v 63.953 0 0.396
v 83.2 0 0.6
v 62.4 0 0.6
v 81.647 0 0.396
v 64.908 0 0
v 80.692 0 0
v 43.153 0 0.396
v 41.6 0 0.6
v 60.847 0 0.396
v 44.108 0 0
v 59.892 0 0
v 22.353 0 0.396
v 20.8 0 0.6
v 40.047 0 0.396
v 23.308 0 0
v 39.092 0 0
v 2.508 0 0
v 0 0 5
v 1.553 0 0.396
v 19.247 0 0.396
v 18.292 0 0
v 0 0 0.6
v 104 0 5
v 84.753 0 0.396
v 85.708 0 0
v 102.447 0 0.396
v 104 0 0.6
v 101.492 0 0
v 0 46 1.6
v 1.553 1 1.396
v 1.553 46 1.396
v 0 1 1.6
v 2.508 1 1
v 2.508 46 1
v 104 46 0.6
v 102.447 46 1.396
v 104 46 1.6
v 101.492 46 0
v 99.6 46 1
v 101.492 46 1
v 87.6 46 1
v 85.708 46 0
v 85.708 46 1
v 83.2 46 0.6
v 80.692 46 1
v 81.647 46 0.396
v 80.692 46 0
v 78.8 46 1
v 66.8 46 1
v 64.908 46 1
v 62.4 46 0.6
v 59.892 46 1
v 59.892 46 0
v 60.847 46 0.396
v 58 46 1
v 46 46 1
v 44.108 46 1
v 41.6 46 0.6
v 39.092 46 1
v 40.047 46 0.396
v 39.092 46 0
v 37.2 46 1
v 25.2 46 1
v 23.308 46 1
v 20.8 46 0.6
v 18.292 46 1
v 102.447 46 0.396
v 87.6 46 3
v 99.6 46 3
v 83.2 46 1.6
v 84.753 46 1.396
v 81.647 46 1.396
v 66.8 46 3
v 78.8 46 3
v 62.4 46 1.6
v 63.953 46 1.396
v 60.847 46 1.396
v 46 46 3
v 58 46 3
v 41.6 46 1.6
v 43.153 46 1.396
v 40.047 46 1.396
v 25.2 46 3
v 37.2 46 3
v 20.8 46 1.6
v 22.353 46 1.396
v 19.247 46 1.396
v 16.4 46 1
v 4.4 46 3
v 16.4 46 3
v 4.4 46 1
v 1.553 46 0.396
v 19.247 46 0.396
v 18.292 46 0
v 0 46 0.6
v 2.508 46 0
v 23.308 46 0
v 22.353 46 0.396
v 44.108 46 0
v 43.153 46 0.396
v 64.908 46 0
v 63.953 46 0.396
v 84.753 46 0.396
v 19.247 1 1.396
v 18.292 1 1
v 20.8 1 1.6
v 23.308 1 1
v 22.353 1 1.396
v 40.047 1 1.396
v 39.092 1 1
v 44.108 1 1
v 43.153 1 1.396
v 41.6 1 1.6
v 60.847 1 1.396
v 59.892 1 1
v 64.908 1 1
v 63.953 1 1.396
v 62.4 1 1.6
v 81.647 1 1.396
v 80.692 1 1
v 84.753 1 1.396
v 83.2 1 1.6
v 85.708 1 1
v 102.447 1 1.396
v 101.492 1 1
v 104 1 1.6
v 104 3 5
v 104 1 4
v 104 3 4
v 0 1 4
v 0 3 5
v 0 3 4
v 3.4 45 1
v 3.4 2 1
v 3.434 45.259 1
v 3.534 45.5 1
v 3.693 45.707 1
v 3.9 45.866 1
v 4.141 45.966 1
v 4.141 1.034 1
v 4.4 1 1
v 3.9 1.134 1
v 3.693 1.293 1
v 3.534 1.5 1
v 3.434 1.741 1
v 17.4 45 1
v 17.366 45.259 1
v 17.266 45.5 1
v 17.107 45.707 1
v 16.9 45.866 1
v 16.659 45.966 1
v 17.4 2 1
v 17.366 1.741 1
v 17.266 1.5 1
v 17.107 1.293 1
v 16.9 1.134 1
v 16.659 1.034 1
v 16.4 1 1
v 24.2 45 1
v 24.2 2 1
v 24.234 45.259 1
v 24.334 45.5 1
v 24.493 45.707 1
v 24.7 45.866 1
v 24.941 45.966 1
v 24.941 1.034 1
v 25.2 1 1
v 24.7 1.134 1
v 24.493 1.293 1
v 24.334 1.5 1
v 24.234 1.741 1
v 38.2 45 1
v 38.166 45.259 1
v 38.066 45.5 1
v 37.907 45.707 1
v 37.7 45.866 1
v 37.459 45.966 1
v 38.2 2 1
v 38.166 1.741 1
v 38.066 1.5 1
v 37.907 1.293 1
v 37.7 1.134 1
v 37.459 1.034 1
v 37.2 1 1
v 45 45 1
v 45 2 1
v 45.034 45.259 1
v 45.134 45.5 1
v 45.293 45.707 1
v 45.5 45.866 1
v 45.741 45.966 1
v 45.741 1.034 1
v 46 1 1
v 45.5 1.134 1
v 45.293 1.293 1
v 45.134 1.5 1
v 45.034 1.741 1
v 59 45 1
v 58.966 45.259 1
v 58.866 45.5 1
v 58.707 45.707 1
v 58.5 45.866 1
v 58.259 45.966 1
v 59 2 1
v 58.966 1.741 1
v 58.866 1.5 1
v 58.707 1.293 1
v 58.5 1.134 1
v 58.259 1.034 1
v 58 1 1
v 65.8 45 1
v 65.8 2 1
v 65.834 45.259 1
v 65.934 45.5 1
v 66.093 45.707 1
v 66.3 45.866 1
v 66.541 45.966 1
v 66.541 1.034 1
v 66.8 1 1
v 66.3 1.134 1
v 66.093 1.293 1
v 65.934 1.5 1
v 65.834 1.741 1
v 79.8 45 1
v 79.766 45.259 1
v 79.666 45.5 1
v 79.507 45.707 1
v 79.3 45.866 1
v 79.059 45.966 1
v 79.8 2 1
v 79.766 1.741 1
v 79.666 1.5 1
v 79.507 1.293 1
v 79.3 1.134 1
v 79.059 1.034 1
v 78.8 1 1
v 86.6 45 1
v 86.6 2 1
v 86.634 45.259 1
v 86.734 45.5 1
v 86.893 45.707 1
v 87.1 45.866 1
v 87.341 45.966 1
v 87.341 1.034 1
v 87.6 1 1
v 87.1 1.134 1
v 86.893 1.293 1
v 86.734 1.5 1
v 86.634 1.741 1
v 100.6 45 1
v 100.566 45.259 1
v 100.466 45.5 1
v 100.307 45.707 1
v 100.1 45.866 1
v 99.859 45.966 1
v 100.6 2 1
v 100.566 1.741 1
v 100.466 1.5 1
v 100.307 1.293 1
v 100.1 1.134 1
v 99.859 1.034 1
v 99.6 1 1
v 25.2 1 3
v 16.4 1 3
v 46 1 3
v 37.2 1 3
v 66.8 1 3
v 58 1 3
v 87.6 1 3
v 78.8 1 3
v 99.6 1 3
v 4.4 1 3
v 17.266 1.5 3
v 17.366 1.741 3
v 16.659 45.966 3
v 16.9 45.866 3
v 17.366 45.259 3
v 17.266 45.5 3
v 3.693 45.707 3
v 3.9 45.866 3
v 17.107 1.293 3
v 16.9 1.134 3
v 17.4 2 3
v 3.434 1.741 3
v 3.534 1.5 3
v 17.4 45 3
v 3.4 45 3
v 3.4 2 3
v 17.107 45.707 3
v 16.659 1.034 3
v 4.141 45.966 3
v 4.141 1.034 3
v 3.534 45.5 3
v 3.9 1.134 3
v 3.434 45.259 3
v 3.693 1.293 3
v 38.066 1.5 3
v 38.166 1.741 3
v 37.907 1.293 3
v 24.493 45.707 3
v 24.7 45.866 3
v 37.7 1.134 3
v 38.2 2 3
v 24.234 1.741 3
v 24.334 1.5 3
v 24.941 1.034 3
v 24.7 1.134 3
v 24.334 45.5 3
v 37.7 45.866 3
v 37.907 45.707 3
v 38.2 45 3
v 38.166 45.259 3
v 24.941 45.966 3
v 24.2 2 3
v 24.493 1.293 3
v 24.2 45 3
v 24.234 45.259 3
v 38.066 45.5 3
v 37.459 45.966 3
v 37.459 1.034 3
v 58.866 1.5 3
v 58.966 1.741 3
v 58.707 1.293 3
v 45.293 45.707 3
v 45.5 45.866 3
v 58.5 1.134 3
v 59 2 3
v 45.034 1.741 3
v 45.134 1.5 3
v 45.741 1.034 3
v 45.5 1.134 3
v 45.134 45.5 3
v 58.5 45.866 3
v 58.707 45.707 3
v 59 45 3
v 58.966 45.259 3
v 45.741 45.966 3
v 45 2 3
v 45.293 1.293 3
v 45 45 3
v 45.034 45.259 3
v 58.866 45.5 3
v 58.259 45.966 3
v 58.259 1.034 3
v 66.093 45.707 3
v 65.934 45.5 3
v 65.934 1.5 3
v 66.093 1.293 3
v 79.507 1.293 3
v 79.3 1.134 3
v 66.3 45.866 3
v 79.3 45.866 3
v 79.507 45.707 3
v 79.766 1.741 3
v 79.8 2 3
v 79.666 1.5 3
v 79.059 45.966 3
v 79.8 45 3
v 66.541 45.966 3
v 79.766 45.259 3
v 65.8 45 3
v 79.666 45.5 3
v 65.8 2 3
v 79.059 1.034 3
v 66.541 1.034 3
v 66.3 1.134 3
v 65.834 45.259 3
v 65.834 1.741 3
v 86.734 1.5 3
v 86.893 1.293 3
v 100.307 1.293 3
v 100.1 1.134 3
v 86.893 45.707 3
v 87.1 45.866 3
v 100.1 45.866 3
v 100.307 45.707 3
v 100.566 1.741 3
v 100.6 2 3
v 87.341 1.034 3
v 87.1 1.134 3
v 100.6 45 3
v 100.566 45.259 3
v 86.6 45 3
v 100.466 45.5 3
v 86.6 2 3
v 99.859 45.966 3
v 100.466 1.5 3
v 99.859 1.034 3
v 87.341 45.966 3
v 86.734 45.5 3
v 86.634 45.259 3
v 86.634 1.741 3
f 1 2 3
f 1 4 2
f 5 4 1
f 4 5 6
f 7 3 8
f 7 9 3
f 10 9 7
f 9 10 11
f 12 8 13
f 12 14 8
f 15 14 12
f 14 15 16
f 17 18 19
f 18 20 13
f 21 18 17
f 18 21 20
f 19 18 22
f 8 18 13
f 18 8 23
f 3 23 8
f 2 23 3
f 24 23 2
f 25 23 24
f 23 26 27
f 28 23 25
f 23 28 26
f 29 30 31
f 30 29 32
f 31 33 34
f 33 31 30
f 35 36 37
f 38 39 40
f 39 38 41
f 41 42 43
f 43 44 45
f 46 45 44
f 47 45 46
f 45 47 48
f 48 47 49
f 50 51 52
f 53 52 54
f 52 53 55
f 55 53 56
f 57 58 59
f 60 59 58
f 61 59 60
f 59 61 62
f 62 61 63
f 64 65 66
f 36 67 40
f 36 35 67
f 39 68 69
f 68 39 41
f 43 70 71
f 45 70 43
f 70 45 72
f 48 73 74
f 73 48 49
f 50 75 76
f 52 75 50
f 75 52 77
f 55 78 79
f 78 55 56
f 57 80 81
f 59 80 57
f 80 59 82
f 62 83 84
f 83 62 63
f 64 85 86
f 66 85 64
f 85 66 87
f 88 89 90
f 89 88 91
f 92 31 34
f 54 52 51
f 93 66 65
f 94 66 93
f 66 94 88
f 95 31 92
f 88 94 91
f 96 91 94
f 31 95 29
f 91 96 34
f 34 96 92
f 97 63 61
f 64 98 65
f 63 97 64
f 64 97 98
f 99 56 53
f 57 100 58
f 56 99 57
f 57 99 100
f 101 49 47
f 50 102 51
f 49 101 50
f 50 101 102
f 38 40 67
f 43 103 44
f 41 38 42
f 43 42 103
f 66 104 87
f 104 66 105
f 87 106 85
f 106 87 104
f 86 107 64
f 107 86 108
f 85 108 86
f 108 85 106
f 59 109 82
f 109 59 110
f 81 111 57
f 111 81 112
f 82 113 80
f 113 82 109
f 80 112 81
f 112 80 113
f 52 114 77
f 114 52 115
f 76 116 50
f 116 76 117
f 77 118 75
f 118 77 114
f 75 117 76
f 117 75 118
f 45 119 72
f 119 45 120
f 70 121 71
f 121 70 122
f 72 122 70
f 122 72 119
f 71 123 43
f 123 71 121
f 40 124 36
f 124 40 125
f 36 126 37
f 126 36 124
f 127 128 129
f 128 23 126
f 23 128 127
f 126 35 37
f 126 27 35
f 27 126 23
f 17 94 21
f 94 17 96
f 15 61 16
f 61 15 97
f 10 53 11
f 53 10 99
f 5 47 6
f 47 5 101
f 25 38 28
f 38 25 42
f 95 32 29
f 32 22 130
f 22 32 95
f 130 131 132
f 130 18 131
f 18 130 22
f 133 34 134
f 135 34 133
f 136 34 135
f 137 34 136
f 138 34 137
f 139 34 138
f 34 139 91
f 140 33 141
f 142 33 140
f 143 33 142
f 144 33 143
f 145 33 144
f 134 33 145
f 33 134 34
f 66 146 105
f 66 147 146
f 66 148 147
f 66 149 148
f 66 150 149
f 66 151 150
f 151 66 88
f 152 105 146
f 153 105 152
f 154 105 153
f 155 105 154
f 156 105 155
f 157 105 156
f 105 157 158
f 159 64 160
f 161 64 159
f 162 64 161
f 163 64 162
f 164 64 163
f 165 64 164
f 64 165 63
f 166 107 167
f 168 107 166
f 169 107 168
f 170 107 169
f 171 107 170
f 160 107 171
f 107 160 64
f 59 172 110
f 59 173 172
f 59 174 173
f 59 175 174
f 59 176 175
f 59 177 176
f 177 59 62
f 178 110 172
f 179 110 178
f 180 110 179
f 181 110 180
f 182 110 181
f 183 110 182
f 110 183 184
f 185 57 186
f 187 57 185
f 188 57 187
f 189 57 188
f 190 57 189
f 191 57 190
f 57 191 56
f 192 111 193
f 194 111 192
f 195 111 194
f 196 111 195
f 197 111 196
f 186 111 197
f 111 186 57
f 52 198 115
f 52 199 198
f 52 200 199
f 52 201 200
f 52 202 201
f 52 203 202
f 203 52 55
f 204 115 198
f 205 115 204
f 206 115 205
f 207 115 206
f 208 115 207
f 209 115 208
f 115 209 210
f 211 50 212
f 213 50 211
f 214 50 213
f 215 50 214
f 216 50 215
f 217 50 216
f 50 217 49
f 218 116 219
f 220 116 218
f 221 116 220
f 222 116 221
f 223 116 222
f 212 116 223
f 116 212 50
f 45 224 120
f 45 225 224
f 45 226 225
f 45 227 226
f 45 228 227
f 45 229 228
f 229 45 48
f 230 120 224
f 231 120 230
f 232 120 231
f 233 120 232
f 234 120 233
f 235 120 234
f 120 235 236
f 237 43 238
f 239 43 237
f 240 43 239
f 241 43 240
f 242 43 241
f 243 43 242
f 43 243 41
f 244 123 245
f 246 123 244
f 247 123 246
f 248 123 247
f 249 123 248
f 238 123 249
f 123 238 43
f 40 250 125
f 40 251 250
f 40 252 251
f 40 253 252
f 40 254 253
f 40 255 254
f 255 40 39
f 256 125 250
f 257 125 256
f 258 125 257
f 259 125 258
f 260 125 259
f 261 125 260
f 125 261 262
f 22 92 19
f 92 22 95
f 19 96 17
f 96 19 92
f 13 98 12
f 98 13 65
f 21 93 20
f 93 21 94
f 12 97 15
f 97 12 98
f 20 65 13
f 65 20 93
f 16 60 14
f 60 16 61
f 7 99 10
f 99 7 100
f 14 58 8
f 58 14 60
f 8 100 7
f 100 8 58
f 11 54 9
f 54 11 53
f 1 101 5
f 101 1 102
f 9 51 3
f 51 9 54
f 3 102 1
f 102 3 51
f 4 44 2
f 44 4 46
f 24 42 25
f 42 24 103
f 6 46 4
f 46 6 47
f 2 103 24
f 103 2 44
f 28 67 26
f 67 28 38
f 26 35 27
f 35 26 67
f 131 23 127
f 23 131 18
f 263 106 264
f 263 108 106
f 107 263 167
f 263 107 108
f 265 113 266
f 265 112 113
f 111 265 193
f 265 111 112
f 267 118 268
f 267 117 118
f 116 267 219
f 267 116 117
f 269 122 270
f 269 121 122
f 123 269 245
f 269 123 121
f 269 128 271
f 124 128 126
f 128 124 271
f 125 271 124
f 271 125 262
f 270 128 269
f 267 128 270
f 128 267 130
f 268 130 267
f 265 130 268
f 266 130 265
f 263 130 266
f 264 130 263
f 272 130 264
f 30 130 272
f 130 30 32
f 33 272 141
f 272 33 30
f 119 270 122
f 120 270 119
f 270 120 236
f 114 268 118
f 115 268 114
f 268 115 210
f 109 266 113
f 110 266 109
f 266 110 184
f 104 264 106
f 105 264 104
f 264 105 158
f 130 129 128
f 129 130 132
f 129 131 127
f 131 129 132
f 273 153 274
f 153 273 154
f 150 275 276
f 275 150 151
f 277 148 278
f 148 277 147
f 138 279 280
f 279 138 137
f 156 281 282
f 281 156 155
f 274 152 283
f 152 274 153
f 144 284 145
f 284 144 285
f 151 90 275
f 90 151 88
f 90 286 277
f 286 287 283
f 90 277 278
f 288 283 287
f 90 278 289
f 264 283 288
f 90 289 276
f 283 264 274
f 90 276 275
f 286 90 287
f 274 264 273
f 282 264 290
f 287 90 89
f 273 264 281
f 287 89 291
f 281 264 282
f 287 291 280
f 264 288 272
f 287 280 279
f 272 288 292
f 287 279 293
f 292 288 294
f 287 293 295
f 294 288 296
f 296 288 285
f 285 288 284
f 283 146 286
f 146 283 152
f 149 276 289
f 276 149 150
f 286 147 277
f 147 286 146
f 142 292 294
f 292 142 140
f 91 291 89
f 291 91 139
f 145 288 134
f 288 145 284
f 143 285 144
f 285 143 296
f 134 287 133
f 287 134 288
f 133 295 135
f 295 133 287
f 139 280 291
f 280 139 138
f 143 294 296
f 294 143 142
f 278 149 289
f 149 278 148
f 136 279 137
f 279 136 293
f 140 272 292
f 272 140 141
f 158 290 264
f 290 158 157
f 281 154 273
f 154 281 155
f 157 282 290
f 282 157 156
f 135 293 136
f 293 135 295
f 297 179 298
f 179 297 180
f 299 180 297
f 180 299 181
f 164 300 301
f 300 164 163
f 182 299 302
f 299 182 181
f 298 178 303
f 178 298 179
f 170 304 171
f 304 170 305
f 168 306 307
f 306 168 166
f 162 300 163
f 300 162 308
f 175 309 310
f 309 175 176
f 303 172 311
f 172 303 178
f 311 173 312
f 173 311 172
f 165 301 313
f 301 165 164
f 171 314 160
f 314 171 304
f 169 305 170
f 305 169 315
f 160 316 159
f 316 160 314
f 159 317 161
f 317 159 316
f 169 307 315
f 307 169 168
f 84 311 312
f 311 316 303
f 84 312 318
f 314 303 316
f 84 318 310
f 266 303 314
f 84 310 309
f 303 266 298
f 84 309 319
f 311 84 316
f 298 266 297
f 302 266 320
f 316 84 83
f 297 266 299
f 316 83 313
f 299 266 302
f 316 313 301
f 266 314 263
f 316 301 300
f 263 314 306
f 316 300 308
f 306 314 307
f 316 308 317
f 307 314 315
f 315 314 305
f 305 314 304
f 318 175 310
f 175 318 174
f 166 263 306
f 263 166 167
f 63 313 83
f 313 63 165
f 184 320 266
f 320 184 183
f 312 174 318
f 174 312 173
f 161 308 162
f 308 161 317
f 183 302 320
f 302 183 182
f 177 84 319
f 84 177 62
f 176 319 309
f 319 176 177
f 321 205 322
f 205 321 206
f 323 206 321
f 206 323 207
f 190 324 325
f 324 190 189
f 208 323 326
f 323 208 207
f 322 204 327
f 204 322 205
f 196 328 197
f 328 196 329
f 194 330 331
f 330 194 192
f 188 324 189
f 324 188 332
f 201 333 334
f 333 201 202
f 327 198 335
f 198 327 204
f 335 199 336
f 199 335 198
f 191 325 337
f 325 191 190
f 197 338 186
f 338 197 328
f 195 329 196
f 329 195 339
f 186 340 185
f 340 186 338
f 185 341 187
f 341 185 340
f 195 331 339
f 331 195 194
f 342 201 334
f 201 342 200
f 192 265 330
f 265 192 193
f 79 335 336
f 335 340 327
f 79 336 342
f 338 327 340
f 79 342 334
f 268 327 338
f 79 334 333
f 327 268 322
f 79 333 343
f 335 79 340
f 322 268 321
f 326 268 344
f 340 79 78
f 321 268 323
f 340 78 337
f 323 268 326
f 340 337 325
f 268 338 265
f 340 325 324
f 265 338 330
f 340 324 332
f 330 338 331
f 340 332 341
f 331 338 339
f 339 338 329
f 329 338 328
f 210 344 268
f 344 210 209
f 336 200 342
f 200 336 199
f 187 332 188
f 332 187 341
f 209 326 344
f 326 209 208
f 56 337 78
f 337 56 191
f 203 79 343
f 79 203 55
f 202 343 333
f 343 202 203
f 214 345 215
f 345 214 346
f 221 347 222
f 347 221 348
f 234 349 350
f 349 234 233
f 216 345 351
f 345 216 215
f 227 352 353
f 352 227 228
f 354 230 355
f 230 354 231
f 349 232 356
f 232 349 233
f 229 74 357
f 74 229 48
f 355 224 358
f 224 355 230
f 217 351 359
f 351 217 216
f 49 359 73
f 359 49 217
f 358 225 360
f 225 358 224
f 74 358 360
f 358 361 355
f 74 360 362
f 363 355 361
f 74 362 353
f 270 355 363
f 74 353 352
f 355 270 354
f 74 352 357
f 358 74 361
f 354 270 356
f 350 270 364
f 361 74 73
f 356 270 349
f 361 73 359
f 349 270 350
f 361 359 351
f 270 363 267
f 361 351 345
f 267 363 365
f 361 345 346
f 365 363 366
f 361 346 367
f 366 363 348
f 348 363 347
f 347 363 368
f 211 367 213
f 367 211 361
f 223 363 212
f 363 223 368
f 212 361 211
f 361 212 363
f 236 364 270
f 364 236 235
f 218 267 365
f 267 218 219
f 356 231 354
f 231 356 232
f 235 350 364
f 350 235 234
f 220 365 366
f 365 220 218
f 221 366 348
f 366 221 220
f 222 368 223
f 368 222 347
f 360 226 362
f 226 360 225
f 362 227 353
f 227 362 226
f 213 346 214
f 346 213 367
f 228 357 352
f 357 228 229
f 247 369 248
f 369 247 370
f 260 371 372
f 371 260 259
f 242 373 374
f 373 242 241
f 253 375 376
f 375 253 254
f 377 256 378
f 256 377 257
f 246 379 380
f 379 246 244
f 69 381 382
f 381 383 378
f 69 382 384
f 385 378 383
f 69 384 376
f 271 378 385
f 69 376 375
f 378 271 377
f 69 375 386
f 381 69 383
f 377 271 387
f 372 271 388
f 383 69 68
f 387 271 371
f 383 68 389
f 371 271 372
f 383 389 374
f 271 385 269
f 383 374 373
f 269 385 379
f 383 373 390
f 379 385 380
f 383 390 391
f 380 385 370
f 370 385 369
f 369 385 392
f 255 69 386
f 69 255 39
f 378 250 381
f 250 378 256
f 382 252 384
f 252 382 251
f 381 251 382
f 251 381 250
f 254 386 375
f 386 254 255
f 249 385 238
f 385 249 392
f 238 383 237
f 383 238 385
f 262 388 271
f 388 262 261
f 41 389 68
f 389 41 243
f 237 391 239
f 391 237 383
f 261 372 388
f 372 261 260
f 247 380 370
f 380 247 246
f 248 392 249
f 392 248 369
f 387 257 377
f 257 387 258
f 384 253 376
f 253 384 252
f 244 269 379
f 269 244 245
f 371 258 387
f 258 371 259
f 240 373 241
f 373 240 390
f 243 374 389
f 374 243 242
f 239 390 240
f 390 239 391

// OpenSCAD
// file: tile.scad
include <const.scad>

tile();

module tile() {
  hull() {
    translate([-(tile_width / 2 - tile_radius), -(tile_height / 2 - tile_radius), 0]) cylinder(r=tile_radius, h=tile_depth, center=true, $fn=24);
    translate([tile_width / 2 - tile_radius, -(tile_height / 2 - tile_radius), 0]) cylinder(r=tile_radius, h=tile_depth, center=true, $fn=24);
    translate([tile_width / 2 - tile_radius, tile_height / 2 - tile_radius, 0]) cylinder(r=tile_radius, h=tile_depth, center=true, $fn=24);
    translate([-(tile_width / 2 - tile_radius), tile_height / 2 - tile_radius, 0]) cylinder(r=tile_radius, h=tile_depth, center=true, $fn=24);
  }
}
// file: const.scad
shift = 1;
tolerance = .2;

tile_count = 5;
tile_radius = 1;
tile_width = 14;
tile_height = 45;
tile_depth = 2;

indicator_radius = 1;
indicator_width = tile_width;
indicator_height = 22;
indicator_depth = 2;

holder_edge = 2;
holder_angle = 10;
holder_connector_radius = 2;
holder_connector_offset = 12;
holder_connector_width = 8;
holder_width = tile_width + 2 * holder_edge + 4 * tolerance;
holder_height = tile_height + 2 * holder_edge + 8 * tolerance;
holder_depth = tile_depth + holder_edge + 4 * tolerance;

base_radius = 4;
base_spacing = 2;
base_width = tile_count * (holder_width + base_spacing);
base_depth = holder_height - 5 * holder_edge - holder_connector_offset + 2 * tolerance;

link_radius = 2;
link_height = link_radius;

foot_radius = 4;
foot_height = 1;
// main file
include <const.scad>
use <tile.scad>

divider_foot = 1;
divider_width = base_width;
divider_height = tile_height + divider_foot;
divider_depth = 1;

divider();

color("teal") {
  for (i = [0:tile_count - 1]) {
    translate([(i + .5) * (holder_width + base_spacing), divider_foot + tile_height / 2, divider_depth + tile_depth / 2]) tile();
  }
}

module divider() {
  difference() {
    union() {
      cube([divider_width, divider_height, divider_depth]);

      intersection() {
        cube([divider_width, divider_height, base_spacing]);
        for (i = [0:tile_count]) {
          translate([i * (holder_width + base_spacing), 0, -2 * base_spacing - 2 * tolerance]) rotate([0, 90, 90]) cylinder(r=3 * base_spacing, h=divider_height, $fn=24);
        }
      }
    }

    for (i = [0:tile_count]) {
      translate([i * (holder_width + base_spacing), -shift / 2, -2 * base_spacing - divider_depth - 2 * tolerance]) rotate([0, 90, 90]) cylinder(r=3 * base_spacing, h=divider_height + shift, $fn=24);
    }
  }

  translate([0, 0, divider_depth]) cube([divider_width, divider_foot, 4 * divider_depth]);
  translate([0, divider_foot, 4 * divider_depth]) cube([divider_width, 2 * divider_depth, divider_depth]);
}
